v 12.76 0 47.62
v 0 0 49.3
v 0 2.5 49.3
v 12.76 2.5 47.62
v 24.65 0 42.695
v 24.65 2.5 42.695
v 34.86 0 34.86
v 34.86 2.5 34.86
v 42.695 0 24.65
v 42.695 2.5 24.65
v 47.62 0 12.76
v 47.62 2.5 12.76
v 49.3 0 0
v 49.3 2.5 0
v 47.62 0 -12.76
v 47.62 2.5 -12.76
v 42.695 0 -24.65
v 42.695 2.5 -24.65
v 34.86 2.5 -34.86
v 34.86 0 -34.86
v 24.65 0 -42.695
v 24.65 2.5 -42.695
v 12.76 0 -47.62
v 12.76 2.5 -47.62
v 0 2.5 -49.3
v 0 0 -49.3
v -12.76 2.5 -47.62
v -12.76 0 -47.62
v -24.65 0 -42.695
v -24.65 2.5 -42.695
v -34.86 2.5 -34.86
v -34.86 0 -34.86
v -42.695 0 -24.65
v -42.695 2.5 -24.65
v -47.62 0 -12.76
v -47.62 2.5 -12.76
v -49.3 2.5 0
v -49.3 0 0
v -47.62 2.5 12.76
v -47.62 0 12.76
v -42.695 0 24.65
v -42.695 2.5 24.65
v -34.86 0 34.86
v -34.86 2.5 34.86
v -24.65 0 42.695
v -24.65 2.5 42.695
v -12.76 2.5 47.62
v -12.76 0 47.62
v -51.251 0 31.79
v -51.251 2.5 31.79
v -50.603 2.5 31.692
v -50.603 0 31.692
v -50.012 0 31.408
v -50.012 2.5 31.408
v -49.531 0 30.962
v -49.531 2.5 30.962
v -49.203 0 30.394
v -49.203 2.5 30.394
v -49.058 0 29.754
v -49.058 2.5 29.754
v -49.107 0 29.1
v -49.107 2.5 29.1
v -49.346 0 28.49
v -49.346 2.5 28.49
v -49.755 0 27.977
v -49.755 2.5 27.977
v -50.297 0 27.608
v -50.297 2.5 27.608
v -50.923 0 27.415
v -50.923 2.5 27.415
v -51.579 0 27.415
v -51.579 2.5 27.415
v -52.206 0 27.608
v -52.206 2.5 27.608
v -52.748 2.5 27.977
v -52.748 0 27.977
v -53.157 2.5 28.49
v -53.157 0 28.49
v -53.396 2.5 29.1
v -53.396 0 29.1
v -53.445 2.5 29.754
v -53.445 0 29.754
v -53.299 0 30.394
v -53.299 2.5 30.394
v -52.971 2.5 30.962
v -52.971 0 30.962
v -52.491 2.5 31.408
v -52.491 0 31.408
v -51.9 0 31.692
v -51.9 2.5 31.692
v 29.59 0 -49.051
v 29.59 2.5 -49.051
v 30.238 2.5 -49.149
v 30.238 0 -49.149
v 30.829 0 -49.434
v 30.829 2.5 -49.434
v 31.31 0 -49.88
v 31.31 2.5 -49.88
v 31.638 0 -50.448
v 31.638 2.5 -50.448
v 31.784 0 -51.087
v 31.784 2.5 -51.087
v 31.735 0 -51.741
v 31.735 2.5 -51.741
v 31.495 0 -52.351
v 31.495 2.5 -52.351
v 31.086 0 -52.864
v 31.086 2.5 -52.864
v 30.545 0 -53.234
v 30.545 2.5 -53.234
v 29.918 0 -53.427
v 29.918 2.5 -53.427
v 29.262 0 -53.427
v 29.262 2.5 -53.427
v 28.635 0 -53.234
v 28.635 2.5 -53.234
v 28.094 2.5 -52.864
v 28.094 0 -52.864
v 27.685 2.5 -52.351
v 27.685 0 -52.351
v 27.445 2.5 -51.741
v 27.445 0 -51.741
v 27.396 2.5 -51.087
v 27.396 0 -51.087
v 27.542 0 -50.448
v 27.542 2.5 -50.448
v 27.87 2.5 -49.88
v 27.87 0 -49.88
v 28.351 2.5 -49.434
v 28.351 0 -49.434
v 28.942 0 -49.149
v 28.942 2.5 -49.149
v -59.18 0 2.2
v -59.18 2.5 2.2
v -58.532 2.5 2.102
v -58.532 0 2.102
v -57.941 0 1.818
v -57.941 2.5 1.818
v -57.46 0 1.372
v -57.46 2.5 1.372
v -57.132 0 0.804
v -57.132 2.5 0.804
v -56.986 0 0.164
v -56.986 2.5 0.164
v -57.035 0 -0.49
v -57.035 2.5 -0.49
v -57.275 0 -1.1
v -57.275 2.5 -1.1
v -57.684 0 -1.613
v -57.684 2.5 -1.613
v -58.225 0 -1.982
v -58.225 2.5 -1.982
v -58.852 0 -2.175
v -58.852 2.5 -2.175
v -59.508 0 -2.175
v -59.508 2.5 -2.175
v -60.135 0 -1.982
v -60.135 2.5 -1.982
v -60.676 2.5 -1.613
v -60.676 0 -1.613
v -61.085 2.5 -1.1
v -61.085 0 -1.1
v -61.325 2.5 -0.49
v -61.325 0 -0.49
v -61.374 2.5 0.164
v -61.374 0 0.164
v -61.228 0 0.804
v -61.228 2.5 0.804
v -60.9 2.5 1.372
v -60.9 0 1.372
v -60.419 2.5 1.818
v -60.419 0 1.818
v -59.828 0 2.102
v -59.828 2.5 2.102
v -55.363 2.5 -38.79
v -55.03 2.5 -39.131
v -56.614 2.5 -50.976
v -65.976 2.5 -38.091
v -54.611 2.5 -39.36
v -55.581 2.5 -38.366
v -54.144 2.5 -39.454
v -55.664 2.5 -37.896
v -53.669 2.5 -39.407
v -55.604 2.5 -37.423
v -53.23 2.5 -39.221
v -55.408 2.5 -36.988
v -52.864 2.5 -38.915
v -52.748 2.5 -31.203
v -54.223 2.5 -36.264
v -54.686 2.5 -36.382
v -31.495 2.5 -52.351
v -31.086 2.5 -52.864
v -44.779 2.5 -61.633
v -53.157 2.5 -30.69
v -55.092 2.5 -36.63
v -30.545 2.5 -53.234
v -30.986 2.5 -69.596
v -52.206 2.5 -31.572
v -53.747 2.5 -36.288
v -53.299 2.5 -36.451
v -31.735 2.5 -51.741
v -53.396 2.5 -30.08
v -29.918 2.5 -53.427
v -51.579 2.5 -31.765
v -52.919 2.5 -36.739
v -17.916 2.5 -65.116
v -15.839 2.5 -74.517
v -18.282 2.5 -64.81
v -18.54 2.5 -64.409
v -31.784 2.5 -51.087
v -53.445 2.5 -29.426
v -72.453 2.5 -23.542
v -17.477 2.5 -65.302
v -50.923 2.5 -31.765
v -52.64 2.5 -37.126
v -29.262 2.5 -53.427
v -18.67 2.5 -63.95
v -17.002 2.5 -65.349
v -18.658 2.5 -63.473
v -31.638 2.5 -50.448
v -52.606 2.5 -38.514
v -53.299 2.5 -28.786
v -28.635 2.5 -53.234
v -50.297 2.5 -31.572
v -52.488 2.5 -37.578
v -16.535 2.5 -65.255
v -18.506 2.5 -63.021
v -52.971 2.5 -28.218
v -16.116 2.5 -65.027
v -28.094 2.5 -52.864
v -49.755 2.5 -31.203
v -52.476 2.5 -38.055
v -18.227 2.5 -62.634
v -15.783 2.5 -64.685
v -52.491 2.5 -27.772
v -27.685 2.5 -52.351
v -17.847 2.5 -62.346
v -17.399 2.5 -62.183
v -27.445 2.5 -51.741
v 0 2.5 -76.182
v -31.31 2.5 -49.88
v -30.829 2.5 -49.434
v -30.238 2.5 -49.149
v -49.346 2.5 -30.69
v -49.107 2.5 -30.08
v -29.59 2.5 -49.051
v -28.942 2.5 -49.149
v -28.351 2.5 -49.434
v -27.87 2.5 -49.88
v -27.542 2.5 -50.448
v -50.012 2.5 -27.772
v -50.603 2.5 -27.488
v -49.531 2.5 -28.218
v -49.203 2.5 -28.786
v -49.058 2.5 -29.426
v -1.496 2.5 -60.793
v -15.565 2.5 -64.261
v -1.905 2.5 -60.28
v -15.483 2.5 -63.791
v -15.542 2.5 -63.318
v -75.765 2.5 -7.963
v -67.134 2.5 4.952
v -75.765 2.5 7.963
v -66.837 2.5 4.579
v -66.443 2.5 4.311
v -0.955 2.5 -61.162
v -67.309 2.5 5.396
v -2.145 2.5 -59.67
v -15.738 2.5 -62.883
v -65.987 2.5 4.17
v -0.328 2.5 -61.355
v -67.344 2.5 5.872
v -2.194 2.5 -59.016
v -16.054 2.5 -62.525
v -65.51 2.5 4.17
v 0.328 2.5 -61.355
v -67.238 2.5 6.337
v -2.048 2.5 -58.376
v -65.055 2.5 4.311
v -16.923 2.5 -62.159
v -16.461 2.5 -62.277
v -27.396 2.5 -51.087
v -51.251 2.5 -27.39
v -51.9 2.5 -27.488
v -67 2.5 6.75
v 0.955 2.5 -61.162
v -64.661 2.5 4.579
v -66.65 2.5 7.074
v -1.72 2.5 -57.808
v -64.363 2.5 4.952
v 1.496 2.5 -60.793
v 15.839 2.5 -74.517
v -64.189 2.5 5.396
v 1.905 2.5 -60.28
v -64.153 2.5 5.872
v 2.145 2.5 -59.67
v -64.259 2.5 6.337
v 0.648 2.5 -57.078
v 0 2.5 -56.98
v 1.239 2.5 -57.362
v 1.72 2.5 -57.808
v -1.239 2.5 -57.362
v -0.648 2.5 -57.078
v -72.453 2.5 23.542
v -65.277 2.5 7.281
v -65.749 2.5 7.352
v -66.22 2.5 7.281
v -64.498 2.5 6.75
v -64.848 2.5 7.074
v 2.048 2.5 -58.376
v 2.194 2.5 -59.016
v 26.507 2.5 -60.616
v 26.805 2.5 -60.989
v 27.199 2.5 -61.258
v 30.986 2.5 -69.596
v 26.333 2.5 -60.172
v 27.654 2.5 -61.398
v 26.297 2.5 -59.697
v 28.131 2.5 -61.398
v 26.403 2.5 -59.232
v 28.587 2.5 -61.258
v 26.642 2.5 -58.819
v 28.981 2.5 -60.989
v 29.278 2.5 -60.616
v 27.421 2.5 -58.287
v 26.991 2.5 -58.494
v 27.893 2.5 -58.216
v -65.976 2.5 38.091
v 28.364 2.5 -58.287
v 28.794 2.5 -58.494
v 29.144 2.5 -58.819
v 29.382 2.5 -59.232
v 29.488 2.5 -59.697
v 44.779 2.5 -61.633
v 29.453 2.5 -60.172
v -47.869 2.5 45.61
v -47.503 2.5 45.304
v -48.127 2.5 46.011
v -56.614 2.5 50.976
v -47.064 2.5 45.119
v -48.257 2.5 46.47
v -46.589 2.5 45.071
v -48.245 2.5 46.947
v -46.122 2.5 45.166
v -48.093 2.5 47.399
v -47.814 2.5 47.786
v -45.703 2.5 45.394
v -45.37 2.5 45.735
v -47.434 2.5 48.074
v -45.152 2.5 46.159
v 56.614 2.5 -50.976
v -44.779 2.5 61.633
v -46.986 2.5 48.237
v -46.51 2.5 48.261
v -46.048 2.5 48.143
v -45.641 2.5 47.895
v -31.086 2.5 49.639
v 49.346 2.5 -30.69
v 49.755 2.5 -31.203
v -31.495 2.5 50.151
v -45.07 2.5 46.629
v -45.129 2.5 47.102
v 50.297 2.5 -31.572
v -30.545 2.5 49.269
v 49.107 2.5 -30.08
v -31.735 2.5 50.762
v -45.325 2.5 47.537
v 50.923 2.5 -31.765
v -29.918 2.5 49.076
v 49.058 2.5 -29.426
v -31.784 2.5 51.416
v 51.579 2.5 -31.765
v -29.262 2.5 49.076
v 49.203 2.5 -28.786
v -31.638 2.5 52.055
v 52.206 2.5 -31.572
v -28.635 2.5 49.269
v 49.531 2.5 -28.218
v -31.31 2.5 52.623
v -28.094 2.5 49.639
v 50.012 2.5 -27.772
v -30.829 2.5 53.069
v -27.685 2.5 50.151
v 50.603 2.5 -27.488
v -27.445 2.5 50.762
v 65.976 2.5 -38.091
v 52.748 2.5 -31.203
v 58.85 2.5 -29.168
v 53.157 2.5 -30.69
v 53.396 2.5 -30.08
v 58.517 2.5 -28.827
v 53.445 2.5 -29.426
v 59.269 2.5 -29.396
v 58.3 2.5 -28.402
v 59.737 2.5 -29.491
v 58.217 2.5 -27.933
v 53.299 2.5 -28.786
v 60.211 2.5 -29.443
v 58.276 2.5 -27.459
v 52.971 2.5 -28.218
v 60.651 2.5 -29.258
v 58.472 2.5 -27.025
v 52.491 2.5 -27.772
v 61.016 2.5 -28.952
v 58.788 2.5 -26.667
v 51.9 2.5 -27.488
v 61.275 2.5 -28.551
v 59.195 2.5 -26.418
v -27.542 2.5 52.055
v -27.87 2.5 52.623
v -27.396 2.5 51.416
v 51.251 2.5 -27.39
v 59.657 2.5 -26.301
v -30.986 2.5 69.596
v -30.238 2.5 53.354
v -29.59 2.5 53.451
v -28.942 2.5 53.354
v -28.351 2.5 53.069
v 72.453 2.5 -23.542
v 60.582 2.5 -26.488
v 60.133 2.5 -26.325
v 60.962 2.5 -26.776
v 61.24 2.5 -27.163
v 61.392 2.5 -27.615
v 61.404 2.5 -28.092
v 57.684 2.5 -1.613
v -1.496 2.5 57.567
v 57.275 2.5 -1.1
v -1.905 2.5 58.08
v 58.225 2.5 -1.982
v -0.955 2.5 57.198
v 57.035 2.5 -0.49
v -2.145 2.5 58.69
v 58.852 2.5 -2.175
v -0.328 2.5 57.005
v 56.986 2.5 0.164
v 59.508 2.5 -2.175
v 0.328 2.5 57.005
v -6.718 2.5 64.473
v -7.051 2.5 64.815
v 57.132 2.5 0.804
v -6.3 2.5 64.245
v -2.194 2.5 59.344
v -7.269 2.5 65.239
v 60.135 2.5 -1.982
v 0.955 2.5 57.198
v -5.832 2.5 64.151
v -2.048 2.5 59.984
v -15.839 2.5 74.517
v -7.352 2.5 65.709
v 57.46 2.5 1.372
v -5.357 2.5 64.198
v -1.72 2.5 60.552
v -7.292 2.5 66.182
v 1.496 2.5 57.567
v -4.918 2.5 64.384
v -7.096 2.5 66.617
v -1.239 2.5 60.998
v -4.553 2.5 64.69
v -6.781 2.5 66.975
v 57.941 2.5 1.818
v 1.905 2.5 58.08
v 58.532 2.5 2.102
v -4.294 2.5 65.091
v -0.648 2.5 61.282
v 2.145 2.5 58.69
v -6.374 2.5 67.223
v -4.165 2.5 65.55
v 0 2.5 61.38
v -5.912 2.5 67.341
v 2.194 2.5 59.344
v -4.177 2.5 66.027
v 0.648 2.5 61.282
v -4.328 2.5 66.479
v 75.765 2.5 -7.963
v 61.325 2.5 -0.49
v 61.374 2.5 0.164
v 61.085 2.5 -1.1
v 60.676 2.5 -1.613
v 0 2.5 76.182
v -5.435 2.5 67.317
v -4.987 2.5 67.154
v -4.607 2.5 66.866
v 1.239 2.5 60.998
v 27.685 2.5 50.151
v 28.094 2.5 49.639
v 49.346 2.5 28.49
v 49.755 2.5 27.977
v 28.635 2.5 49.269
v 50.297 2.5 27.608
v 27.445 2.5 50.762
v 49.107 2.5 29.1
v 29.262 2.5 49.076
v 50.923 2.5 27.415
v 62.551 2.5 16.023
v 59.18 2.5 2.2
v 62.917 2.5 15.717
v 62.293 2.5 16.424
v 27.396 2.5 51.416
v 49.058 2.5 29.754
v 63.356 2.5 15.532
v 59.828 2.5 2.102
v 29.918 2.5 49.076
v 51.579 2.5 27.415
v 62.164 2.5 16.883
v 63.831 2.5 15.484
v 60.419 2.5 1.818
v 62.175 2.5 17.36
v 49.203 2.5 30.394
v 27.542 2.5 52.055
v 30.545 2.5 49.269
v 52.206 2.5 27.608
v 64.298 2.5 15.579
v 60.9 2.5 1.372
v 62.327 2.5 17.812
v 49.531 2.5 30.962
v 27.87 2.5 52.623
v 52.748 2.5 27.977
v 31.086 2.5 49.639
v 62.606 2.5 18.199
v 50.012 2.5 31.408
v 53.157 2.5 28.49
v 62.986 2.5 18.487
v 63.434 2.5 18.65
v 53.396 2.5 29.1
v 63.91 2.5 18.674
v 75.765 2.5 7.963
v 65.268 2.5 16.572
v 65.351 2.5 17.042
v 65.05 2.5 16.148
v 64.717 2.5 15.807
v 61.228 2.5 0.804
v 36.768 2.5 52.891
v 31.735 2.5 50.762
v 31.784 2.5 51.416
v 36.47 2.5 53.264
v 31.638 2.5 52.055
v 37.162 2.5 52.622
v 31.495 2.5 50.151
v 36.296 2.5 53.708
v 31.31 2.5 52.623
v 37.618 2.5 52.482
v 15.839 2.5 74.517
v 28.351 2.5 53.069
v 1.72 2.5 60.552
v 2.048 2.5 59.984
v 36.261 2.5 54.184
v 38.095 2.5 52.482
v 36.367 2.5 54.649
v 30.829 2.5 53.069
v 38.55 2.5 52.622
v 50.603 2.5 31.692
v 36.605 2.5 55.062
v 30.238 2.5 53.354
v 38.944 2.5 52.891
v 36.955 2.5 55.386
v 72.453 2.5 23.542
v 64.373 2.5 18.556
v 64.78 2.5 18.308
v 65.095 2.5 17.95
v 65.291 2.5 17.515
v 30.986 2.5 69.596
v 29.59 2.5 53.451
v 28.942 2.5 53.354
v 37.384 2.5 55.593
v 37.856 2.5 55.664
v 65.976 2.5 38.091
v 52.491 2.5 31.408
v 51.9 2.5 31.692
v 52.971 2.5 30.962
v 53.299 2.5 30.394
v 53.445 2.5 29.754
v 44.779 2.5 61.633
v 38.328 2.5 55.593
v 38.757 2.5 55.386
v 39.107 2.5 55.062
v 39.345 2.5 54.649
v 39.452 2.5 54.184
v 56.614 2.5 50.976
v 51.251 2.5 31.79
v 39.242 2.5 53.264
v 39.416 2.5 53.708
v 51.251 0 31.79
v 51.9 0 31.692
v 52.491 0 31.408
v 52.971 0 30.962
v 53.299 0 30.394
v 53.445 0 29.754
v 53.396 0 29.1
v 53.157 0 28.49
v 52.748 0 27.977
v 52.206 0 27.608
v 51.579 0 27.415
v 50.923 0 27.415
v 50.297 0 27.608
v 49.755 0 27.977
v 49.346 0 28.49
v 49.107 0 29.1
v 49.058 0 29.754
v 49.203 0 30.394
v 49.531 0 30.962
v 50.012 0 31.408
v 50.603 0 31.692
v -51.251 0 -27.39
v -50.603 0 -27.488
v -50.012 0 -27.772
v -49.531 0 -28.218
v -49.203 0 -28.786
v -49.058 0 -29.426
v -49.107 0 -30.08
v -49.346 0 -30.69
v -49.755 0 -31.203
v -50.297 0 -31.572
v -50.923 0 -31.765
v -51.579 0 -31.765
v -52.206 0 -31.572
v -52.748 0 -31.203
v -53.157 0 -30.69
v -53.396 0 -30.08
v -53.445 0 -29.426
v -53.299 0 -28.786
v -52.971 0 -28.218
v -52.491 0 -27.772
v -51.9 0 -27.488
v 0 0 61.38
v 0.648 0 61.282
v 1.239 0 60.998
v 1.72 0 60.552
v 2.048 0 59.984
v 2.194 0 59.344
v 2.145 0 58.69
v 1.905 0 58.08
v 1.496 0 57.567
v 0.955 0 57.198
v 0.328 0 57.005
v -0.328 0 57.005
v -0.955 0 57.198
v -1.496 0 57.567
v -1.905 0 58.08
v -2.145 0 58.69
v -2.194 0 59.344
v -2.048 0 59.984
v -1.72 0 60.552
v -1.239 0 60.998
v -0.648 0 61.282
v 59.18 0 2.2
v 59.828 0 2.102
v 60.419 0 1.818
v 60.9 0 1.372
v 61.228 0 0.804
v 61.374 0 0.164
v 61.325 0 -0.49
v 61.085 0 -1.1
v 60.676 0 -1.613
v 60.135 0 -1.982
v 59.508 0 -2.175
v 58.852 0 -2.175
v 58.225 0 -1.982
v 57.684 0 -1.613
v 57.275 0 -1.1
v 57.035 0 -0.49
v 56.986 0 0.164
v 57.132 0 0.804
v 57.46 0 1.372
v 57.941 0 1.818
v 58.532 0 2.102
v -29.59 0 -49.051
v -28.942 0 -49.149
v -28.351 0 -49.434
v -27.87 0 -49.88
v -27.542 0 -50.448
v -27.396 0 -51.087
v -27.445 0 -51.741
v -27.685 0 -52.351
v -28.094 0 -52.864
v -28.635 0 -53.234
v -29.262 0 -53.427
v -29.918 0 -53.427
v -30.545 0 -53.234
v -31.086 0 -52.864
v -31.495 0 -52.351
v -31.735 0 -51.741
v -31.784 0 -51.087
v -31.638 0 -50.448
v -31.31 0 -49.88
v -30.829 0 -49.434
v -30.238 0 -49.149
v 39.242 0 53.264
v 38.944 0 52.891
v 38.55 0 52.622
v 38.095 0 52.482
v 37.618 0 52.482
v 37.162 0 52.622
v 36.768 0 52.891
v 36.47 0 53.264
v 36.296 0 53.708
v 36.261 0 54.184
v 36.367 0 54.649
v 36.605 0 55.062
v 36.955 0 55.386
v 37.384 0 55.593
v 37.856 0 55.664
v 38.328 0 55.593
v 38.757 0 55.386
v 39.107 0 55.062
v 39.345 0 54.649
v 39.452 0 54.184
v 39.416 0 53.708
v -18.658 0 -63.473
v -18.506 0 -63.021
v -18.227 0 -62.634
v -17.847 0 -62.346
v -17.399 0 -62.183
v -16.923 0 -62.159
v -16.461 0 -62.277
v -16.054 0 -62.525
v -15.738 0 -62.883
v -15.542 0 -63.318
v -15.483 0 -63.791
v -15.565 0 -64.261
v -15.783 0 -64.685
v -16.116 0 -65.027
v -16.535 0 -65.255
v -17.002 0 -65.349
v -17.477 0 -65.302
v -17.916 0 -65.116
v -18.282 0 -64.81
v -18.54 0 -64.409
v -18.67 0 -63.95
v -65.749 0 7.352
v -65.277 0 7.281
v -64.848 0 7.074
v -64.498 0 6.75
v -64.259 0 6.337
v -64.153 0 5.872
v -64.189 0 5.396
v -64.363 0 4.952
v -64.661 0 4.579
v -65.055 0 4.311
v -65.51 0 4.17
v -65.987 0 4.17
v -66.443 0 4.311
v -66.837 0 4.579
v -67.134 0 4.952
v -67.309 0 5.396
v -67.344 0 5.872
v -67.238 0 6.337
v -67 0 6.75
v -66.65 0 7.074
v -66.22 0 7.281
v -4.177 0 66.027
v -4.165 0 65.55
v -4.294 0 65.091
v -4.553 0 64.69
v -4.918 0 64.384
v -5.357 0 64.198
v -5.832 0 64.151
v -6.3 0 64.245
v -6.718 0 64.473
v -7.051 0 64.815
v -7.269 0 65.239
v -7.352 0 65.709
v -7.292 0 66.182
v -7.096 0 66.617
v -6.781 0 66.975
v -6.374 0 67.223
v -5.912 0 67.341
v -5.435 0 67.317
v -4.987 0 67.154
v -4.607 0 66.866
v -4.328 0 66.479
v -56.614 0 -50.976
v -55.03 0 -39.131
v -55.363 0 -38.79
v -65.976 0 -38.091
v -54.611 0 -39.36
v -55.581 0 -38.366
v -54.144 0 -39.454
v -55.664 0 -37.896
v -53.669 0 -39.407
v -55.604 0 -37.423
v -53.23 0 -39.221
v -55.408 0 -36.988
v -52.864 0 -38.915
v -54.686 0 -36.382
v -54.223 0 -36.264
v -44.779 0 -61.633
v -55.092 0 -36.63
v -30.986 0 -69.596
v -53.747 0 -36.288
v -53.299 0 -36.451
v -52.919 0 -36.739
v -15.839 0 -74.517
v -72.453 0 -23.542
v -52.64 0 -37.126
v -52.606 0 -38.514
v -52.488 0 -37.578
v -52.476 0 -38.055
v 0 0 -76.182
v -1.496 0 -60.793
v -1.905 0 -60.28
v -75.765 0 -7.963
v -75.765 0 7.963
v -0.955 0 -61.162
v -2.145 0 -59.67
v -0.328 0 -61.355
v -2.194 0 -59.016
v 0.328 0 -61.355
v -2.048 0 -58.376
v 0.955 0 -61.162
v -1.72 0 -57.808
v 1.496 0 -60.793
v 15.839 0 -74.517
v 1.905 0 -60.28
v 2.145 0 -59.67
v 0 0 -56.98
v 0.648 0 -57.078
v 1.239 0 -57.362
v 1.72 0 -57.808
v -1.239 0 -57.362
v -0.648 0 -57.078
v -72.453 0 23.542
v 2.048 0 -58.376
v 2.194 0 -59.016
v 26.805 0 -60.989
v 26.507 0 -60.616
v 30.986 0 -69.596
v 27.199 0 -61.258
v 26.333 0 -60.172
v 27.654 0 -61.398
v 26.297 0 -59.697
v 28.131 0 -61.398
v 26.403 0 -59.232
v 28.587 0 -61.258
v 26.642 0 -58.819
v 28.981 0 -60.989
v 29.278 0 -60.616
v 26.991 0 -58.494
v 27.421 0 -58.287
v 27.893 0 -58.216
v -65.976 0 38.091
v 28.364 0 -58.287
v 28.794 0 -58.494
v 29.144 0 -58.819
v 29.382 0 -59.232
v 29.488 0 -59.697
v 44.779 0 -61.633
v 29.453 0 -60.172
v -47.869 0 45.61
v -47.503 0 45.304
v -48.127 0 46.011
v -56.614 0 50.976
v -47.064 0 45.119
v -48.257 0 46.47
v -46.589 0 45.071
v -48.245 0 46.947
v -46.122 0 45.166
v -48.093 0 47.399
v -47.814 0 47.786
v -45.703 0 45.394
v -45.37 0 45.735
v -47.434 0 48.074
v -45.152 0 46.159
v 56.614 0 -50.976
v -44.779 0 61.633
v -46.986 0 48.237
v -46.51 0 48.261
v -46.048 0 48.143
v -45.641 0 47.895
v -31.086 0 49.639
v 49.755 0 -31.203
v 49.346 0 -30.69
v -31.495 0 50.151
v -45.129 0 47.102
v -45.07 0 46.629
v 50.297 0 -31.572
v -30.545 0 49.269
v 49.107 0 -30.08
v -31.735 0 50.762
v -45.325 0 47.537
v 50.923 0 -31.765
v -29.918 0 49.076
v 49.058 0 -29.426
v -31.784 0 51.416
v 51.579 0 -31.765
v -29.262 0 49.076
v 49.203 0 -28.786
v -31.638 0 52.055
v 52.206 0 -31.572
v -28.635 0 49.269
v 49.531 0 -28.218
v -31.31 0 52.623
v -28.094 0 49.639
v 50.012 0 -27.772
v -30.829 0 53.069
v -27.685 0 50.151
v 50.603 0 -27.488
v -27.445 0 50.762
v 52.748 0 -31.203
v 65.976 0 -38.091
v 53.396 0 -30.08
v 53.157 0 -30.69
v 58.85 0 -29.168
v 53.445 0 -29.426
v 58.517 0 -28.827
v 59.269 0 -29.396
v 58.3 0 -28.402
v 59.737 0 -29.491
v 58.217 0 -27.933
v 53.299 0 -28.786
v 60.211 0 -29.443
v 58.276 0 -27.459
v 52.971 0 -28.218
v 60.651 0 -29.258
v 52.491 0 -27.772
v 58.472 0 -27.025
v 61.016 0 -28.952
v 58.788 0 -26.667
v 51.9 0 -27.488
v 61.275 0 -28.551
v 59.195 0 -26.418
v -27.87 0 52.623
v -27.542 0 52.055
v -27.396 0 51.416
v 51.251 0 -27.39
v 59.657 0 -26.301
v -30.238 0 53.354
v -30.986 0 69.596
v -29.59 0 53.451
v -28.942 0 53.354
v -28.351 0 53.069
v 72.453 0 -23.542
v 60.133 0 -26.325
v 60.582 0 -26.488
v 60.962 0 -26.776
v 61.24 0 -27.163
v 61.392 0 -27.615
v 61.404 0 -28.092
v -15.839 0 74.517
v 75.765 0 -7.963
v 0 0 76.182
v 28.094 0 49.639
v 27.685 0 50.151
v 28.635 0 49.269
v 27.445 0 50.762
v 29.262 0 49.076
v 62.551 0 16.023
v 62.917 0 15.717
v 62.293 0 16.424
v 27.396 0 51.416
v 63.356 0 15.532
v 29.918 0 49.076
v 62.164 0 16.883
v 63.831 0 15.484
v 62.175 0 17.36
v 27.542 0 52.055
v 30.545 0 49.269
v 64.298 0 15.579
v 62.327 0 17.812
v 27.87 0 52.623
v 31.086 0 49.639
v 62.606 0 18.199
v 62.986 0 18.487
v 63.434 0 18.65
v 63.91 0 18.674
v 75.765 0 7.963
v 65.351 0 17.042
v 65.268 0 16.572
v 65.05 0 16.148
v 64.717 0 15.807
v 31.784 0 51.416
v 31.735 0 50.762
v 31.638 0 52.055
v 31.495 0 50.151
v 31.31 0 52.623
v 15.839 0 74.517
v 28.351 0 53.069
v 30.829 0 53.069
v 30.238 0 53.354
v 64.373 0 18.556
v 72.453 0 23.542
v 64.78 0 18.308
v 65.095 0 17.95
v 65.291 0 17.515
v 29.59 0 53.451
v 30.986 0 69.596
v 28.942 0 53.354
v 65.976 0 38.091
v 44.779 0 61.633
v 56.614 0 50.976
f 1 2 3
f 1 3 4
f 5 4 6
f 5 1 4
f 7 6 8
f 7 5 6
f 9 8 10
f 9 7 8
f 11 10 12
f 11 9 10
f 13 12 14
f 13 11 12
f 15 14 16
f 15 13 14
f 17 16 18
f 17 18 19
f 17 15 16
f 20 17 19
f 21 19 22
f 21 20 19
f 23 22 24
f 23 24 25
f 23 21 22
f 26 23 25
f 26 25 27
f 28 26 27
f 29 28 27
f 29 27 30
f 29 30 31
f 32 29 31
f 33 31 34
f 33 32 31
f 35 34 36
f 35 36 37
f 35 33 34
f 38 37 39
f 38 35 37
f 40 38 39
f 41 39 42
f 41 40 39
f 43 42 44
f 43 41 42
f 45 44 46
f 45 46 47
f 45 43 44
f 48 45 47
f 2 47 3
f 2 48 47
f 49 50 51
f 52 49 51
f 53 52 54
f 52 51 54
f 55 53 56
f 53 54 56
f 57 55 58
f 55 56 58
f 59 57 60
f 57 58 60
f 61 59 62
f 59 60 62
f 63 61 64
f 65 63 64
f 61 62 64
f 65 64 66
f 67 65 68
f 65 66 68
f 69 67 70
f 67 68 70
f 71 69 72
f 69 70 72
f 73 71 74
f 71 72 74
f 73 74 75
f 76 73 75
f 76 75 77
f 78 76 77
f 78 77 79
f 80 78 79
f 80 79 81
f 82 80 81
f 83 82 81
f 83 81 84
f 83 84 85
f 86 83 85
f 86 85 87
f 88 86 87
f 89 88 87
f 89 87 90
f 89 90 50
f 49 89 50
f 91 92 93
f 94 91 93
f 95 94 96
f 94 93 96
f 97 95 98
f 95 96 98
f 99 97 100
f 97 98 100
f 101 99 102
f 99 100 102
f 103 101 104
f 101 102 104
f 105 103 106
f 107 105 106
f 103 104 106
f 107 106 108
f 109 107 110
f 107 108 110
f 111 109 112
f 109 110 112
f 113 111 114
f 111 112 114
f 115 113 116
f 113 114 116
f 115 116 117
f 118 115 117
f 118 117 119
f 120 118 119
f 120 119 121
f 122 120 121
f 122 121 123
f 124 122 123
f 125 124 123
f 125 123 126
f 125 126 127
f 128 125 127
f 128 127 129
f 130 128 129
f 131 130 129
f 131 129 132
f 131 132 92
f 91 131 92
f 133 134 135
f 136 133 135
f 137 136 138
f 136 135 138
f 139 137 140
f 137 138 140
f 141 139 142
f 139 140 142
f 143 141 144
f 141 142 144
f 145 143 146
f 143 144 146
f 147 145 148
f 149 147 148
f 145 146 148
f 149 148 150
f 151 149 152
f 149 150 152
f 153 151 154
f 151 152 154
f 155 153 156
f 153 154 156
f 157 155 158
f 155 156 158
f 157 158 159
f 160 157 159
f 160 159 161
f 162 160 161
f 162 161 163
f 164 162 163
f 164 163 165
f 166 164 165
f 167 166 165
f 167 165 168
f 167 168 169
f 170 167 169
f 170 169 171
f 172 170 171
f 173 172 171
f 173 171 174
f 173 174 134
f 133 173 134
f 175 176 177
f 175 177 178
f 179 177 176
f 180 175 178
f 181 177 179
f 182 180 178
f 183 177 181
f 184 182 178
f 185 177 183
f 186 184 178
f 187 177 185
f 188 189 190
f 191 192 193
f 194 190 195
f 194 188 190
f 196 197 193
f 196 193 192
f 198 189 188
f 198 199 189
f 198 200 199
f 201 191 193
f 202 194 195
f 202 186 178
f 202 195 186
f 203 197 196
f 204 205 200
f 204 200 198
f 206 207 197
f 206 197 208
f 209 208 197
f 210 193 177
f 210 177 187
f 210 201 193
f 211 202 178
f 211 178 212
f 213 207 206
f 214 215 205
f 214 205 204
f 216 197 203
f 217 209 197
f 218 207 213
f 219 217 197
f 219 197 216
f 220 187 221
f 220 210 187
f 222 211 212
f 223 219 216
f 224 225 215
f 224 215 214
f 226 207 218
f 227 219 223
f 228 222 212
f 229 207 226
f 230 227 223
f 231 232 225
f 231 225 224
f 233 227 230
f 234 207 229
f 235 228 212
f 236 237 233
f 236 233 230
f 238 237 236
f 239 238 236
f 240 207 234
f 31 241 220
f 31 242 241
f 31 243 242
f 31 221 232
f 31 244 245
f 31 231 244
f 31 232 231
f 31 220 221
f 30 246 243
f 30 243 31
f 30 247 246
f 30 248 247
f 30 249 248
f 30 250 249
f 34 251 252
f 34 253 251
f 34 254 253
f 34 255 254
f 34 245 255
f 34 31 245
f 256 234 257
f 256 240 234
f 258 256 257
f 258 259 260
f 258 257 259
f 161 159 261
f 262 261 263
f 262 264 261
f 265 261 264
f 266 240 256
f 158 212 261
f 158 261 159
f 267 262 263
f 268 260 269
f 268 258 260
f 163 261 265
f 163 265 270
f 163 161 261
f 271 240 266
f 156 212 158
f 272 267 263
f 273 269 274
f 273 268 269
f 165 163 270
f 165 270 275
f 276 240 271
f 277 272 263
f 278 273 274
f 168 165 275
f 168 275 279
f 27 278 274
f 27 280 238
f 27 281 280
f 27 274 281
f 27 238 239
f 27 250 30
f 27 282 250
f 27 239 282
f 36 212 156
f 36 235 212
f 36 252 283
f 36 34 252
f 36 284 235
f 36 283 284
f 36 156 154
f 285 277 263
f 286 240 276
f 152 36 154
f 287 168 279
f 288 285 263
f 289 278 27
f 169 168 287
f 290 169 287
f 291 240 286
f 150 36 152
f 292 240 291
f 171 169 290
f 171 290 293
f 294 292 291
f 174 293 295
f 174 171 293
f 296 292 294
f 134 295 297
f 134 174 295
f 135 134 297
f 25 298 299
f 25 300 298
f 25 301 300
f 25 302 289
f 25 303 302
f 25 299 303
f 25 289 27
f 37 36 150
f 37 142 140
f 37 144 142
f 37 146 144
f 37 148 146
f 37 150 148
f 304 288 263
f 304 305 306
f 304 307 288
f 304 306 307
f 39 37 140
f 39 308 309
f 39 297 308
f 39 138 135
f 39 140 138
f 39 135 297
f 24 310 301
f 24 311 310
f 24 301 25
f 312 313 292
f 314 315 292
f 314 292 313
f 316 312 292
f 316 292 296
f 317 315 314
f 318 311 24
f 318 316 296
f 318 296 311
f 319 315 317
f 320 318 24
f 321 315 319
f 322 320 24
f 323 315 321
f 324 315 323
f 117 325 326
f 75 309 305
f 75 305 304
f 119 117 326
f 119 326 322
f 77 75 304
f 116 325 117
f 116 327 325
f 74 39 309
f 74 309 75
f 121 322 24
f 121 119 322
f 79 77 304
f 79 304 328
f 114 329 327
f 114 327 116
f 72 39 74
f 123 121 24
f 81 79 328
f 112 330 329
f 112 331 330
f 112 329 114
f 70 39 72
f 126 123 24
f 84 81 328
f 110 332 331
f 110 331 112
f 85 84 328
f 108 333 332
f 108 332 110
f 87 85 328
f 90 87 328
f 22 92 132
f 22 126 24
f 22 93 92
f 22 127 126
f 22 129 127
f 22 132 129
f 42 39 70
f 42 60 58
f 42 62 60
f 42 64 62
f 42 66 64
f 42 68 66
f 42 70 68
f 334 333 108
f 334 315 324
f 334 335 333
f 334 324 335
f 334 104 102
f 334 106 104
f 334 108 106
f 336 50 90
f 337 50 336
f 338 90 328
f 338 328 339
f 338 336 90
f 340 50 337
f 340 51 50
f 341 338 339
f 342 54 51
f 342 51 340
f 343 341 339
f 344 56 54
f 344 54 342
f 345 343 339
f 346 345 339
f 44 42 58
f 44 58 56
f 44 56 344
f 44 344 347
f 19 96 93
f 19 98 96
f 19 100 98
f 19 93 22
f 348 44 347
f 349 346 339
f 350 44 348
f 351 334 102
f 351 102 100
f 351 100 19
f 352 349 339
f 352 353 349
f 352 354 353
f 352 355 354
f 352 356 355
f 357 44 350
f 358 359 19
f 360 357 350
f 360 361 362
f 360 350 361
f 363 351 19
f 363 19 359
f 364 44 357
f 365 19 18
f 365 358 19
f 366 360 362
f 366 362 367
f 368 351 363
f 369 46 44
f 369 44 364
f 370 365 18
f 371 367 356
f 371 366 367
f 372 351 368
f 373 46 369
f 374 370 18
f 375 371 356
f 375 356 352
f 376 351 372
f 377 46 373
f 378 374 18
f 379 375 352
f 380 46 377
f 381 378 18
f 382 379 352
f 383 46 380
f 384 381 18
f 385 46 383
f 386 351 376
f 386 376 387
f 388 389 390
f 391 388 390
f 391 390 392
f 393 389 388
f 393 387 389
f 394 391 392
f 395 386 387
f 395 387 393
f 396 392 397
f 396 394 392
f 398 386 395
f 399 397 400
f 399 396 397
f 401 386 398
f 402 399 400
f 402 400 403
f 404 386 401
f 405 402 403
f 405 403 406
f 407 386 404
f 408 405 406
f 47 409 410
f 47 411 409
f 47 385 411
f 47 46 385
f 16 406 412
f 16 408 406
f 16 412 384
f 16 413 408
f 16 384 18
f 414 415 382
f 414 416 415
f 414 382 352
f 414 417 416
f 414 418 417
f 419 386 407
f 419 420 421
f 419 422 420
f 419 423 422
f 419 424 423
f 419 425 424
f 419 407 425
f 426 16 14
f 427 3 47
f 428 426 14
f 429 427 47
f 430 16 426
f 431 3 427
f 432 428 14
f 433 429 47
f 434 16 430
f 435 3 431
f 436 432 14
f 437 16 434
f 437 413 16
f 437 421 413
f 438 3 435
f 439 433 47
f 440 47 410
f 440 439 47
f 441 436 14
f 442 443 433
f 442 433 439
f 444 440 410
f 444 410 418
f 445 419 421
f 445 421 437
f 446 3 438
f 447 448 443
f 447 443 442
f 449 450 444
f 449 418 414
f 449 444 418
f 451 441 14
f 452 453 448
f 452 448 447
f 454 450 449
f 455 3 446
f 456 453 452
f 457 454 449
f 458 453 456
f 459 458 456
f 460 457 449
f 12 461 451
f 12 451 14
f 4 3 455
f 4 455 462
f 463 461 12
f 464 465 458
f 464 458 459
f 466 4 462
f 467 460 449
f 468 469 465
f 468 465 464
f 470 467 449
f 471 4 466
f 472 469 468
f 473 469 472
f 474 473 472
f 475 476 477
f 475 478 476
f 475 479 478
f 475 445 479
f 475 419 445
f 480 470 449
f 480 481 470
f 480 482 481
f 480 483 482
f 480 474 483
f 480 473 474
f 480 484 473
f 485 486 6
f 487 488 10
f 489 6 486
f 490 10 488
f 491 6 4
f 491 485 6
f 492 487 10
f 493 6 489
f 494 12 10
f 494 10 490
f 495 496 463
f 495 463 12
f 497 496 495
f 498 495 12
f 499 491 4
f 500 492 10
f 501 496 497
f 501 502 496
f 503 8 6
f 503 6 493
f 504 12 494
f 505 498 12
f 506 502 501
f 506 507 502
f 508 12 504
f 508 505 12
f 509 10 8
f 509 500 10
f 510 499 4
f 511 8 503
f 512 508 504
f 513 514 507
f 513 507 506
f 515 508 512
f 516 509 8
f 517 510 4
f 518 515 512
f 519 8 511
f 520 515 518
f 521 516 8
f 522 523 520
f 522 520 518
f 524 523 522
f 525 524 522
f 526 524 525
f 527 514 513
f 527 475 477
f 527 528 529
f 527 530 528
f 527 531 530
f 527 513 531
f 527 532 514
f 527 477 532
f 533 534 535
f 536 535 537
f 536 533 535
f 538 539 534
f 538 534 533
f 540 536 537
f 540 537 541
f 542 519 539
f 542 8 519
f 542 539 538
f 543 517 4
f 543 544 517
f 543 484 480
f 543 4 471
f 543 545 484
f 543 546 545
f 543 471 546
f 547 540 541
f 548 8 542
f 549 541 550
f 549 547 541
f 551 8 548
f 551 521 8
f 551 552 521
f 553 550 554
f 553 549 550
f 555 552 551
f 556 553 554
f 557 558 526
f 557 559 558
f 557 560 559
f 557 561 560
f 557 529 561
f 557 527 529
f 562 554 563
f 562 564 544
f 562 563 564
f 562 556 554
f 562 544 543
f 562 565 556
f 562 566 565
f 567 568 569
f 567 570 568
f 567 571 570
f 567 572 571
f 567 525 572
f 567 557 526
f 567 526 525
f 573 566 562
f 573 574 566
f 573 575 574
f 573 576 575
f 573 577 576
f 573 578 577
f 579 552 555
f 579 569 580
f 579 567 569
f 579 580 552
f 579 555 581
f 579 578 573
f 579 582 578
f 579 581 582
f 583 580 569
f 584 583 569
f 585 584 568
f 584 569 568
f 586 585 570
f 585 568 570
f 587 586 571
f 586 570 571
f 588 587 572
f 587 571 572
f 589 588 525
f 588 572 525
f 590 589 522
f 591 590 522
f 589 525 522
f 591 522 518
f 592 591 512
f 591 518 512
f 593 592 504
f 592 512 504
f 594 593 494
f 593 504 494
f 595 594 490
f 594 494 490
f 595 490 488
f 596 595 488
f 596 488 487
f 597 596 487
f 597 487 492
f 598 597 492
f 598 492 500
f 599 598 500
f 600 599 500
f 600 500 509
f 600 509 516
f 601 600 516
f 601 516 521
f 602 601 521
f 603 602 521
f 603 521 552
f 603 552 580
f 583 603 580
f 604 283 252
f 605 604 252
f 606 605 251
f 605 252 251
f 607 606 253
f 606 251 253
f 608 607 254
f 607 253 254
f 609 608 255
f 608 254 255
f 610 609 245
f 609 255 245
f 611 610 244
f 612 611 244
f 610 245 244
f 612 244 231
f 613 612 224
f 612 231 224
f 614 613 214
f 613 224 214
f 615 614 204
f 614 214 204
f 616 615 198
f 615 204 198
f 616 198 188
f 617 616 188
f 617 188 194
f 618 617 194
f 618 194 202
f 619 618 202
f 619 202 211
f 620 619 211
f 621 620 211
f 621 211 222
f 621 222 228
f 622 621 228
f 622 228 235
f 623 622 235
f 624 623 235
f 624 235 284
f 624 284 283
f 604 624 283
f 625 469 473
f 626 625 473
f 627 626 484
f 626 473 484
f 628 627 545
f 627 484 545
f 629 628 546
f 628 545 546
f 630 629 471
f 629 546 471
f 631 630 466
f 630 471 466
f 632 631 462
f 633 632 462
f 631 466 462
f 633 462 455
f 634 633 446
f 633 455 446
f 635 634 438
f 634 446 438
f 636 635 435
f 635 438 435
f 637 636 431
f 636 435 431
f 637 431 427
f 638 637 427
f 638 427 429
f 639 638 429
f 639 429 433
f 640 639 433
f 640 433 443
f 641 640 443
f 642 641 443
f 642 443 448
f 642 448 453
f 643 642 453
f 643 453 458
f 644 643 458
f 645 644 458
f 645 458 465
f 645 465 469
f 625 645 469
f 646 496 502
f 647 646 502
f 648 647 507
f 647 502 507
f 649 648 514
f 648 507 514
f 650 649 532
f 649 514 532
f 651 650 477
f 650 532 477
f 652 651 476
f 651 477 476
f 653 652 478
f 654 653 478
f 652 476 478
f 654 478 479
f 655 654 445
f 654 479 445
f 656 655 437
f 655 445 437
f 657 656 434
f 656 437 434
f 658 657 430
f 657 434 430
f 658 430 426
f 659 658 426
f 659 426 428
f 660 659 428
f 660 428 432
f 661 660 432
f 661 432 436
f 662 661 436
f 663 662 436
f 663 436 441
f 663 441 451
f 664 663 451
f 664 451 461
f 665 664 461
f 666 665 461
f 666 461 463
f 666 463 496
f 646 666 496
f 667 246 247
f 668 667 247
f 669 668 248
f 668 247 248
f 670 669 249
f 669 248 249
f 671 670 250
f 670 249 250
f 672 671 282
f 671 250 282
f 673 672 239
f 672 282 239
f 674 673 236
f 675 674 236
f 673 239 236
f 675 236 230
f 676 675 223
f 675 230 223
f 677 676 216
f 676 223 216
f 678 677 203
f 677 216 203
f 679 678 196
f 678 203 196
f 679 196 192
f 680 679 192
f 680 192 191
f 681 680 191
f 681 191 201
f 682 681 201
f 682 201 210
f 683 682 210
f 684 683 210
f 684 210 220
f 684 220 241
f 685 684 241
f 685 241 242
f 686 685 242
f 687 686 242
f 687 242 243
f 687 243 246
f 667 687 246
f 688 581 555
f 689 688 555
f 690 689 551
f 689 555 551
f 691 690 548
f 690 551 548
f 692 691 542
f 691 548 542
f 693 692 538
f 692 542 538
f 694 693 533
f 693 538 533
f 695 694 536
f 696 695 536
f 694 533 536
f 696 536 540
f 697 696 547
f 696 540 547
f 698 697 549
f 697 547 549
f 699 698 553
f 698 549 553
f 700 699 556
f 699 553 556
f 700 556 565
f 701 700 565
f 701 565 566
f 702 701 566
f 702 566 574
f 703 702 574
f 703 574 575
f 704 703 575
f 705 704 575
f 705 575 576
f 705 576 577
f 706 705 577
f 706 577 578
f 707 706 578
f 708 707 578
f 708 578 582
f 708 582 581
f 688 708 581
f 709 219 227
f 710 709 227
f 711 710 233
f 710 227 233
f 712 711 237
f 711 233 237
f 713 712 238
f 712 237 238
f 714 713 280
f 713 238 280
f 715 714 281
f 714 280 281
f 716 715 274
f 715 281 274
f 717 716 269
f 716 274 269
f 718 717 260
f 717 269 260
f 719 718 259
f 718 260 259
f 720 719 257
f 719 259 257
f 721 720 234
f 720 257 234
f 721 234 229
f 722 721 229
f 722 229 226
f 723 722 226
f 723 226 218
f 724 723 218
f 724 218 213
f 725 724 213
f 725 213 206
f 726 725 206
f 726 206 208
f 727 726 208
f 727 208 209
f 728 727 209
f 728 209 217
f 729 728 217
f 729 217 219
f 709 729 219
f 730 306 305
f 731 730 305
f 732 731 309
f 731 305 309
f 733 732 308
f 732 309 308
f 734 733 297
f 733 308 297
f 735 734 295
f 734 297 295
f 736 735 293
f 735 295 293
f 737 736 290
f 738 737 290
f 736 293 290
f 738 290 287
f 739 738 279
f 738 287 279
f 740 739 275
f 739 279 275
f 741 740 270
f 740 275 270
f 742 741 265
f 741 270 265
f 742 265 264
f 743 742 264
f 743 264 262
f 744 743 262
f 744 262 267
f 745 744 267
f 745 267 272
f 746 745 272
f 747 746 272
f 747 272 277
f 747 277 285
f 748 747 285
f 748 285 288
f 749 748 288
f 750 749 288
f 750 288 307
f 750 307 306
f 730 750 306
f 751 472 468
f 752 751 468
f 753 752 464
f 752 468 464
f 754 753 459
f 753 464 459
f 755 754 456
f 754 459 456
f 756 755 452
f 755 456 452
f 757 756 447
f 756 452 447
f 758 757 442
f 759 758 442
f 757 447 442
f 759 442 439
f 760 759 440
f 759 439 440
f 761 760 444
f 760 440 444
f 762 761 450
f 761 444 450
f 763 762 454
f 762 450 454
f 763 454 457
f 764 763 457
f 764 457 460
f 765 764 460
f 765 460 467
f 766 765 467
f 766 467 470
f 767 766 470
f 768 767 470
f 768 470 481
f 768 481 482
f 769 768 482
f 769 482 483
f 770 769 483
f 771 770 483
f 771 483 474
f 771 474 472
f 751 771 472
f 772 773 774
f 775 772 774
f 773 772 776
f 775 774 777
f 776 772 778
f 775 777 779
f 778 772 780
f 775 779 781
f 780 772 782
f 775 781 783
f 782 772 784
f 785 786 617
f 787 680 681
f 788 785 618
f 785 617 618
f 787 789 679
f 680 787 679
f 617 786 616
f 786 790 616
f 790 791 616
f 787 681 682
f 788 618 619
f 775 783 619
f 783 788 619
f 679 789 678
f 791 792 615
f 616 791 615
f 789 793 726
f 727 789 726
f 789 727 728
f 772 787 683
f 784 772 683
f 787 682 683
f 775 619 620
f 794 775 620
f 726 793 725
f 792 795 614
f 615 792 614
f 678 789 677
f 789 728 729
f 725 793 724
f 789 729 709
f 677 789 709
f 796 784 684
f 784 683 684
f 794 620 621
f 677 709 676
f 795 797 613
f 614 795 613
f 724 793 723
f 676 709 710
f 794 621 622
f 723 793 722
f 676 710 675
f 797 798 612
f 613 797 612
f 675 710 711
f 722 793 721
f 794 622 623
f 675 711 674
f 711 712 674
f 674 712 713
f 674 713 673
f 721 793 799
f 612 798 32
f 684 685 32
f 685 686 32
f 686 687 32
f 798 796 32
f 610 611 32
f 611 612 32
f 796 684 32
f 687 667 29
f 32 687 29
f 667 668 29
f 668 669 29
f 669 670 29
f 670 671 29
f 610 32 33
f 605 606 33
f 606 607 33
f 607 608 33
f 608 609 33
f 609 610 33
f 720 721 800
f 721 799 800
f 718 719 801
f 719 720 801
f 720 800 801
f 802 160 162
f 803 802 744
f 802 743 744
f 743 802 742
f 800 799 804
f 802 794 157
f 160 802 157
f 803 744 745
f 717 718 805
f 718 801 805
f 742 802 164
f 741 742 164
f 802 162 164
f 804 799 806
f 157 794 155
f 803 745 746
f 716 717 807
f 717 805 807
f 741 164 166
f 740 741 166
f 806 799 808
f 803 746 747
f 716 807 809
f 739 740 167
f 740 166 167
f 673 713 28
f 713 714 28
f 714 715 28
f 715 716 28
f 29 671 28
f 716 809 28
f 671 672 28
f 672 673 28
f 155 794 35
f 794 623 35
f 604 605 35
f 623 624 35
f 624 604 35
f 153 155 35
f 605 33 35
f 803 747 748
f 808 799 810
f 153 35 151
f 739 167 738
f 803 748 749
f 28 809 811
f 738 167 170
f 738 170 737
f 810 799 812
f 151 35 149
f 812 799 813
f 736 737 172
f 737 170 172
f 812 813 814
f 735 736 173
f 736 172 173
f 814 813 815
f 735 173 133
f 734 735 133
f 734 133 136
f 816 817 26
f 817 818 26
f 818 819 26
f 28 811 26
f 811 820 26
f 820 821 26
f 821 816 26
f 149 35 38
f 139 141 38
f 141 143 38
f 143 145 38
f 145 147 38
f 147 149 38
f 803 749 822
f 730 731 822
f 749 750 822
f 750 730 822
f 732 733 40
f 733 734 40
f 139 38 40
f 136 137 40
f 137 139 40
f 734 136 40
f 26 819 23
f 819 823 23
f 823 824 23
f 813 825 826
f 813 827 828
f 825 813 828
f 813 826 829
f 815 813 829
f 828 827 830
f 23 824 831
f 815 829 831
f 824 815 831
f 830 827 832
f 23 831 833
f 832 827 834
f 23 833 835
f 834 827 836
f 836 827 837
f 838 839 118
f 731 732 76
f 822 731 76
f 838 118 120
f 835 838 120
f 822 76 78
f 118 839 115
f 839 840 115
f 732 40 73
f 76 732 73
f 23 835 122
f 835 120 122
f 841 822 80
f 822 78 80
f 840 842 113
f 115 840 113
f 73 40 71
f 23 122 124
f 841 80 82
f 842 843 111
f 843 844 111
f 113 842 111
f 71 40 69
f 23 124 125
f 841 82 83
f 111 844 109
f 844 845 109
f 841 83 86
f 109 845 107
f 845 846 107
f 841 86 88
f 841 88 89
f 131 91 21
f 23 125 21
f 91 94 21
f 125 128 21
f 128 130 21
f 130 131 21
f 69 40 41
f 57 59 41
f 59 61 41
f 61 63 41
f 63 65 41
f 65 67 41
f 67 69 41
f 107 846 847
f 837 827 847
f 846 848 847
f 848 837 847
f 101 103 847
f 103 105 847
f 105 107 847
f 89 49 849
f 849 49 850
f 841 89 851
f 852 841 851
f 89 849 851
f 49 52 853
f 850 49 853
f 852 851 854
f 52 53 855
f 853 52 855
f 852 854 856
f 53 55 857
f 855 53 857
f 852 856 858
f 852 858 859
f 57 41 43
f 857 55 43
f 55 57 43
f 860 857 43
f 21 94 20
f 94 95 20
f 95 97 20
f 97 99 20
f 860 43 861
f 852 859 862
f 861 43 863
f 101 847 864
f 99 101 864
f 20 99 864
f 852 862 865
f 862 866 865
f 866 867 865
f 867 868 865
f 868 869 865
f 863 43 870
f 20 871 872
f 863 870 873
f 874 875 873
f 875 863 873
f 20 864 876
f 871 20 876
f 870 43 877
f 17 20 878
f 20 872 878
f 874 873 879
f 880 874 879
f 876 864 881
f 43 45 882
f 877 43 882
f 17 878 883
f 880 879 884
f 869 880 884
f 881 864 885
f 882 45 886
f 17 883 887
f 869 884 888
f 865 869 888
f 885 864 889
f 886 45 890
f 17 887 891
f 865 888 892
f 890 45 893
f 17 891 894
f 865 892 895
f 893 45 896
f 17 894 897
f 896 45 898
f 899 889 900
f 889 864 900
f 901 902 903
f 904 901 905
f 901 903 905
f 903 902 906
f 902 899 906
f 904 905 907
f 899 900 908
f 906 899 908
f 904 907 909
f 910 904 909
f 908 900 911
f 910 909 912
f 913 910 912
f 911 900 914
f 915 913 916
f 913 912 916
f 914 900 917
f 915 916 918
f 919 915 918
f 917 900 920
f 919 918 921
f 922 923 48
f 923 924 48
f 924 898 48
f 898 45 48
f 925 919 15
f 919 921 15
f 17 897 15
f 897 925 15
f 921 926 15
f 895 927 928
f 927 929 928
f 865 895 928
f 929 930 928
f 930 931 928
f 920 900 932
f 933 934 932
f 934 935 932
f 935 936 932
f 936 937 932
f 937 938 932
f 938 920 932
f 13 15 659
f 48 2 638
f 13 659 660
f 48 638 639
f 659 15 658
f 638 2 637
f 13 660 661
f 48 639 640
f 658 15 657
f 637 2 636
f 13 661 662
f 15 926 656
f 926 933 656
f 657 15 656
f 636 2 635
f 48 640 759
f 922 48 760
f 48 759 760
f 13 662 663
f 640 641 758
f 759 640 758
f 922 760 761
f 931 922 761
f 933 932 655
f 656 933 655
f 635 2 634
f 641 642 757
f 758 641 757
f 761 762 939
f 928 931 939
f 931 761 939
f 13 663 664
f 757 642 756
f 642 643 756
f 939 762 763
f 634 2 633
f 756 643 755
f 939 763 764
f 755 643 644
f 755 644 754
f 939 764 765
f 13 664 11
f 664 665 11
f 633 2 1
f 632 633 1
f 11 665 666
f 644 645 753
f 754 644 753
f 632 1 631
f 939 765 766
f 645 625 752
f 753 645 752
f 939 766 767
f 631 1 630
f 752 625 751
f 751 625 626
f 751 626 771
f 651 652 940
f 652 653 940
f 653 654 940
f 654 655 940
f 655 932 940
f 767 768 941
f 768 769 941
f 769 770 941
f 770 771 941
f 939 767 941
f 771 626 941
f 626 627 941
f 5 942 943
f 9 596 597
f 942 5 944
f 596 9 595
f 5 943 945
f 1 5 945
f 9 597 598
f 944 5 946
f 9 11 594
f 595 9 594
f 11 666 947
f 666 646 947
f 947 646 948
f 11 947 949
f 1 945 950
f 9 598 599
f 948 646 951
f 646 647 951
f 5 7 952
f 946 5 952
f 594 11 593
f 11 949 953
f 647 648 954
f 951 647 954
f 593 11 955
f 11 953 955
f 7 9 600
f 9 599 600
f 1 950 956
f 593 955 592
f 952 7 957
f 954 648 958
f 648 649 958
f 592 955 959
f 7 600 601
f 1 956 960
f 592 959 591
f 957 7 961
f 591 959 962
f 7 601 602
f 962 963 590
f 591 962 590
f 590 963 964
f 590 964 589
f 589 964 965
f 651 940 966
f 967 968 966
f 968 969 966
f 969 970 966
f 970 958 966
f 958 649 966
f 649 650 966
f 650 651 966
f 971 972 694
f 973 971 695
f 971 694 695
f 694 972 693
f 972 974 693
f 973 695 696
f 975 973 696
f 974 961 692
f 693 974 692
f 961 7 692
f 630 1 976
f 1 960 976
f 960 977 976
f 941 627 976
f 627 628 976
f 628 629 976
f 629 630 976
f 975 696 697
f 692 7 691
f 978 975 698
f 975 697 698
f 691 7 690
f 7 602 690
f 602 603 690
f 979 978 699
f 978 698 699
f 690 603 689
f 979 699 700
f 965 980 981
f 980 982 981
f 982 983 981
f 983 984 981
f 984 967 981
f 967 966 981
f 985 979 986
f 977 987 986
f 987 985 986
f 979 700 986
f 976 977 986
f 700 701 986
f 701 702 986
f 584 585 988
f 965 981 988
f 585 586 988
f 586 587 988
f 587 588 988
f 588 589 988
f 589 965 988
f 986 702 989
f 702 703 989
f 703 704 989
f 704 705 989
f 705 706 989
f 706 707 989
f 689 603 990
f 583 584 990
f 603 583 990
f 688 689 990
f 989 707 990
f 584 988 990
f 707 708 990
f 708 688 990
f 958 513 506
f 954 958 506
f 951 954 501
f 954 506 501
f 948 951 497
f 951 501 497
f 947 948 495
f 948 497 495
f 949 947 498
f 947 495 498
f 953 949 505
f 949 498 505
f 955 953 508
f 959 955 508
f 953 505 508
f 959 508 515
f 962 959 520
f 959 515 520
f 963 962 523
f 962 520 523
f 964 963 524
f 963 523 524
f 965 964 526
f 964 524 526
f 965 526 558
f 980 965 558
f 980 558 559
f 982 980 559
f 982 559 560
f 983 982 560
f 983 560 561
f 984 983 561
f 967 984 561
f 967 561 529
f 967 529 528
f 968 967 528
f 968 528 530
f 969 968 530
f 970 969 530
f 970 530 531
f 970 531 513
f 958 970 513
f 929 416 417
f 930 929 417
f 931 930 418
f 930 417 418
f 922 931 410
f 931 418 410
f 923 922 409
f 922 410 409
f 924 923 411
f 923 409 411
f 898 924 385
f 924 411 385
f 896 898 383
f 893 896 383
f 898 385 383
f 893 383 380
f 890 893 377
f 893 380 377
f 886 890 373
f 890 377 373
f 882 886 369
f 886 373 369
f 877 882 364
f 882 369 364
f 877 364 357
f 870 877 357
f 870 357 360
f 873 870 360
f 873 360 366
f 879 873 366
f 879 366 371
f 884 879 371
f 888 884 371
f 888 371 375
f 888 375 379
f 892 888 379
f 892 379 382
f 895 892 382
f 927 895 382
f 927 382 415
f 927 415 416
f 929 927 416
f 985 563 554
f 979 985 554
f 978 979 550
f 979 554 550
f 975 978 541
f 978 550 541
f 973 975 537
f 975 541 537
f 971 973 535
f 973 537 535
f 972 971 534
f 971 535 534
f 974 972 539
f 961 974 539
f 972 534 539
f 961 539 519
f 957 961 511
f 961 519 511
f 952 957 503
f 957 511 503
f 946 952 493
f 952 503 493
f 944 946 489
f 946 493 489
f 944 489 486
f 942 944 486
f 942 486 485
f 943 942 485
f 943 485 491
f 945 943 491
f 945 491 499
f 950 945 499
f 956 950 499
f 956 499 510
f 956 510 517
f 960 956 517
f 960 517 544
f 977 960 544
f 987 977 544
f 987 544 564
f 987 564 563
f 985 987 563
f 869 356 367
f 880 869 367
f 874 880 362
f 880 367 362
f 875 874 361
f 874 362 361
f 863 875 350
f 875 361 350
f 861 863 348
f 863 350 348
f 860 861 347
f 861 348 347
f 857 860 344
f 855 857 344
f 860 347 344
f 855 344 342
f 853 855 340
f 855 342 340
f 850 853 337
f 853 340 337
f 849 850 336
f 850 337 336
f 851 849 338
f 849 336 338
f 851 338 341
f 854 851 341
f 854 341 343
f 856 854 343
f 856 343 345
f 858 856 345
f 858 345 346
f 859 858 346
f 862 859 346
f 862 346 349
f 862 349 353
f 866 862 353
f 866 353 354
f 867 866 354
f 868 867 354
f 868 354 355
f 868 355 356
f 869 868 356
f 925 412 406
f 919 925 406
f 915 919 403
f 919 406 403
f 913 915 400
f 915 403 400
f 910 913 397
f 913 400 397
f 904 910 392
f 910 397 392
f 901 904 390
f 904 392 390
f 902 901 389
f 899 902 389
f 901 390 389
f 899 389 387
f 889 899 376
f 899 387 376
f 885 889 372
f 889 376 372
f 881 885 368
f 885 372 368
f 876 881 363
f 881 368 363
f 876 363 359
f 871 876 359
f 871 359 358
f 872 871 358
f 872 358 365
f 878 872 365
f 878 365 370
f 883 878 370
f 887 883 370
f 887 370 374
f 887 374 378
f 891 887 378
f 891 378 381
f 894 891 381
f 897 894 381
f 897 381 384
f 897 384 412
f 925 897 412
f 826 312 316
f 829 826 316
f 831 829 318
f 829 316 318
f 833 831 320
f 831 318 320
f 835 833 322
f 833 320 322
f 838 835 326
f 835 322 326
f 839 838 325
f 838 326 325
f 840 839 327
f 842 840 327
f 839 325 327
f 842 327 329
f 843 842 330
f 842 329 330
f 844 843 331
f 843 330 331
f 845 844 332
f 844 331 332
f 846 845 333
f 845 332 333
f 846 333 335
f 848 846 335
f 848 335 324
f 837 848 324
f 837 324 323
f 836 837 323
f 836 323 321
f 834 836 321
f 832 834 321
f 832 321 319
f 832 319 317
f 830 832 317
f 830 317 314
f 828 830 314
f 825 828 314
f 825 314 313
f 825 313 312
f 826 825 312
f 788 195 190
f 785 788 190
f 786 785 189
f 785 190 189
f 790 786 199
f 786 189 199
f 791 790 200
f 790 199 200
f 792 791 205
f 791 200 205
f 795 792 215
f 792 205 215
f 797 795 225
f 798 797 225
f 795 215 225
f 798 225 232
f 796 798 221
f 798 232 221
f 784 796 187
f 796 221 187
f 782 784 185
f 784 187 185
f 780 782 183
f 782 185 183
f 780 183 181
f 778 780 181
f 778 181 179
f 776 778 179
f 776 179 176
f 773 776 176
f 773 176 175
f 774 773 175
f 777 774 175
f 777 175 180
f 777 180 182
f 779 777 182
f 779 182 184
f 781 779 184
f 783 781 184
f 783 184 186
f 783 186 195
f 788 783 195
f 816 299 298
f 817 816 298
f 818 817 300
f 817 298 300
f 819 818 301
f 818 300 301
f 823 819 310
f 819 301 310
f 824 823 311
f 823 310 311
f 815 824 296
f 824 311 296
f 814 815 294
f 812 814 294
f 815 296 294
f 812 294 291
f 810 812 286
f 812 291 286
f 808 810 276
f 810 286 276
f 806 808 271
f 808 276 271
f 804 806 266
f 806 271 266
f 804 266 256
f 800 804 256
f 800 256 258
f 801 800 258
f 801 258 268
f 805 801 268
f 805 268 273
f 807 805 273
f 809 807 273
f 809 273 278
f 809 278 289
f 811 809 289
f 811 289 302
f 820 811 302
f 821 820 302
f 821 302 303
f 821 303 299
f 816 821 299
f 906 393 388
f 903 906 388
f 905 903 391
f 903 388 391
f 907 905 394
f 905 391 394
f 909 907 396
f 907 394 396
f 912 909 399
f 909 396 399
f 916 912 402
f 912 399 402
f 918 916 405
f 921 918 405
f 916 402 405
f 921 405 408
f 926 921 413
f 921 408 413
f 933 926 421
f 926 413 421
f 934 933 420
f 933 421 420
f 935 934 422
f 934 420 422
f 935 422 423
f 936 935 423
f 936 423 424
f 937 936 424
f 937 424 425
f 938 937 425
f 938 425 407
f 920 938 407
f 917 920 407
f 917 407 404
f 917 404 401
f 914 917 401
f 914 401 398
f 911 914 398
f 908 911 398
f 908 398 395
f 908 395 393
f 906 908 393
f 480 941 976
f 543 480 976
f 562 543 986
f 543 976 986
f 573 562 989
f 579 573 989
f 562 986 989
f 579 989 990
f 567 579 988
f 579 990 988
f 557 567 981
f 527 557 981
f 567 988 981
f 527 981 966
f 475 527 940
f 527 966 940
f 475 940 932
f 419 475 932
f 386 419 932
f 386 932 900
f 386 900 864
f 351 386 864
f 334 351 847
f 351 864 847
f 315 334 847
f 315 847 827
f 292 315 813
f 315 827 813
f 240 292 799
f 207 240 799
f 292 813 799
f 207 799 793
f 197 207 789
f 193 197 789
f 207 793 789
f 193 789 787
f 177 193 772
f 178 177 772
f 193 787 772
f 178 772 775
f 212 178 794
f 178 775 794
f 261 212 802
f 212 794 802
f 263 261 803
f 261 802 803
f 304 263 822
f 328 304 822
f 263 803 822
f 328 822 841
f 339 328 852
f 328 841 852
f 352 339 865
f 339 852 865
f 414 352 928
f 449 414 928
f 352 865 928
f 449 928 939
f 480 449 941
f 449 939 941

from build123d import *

# Parameters (mm, degrees)
SKETCH1_R           = 76.182
SKETCH1_R_2         = 49.3
BOSS_EXTRUDE1_DEPTH = 2.5
SKETCH2_R           = 1.6
CUT_EXTRUDE1_DEPTH  = 108.766619359
SKETCH3_R           = 2.2
CUT_EXTRUDE2_DEPTH  = 108.766619359
CIRPATTERN1_COUNT   = 9


with BuildPart() as part:
    # Sketch1 → Boss-Extrude1 (new body)
    with BuildSketch(Plane(origin=(0, 0, 0), x_dir=(1, 0, 0), z_dir=(0, 1, 0))):
        with Locations(Location((0, 0, 0), (0, 0, 270))):
            Circle(SKETCH1_R)
        with Locations(Location((0, 0, 0), (0, 0, 270))):
            Circle(SKETCH1_R_2, mode=Mode.SUBTRACT)
    extrude(amount=BOSS_EXTRUDE1_DEPTH)

    # Sketch2 → Cut-Extrude1 (cut, through all)
    with BuildSketch(Plane(origin=(0, 2.5, 0), x_dir=(1, 0, 0), z_dir=(0, 1, 0))):
        with Locations(Location((-65.748850074, -5.752279021, 0), (0, 0, 270))):
            Circle(SKETCH2_R)
    cut_extrude1 = extrude(amount=-CUT_EXTRUDE1_DEPTH, mode=Mode.SUBTRACT)

    # Sketch3 → Cut-Extrude2 (cut, through all)
    with BuildSketch(Plane(origin=(0, 2.5, 0), x_dir=(1, 0, 0), z_dir=(0, 1, 0))):
        with Locations(Location((0, 59.18, 0), (0, 0, 270))):
            Circle(SKETCH3_R)
        with Locations(Location((29.59, 51.251383396, 0), (0, 0, 270))):
            Circle(SKETCH3_R)
        with Locations(Location((51.251383396, 29.59, 0), (0, 0, 270))):
            Circle(SKETCH3_R)
        with Locations(Location((59.18, 0, 0), (0, 0, 270))):
            Circle(SKETCH3_R)
        with Locations(Location((51.251383396, -29.59, 0), (0, 0, 270))):
            Circle(SKETCH3_R)
        with Locations(Location((29.59, -51.251383396, 0), (0, 0, 270))):
            Circle(SKETCH3_R)
        with Locations(Location((0, -59.18, 0), (0, 0, 270))):
            Circle(SKETCH3_R)
        with Locations(Location((-29.59, -51.251383396, 0), (0, 0, 270))):
            Circle(SKETCH3_R)
        with Locations(Location((-51.251383396, -29.59, 0), (0, 0, 270))):
            Circle(SKETCH3_R)
        with Locations(Location((-59.18, 0, 0), (0, 0, 270))):
            Circle(SKETCH3_R)
        with Locations(Location((-51.251383396, 29.59, 0), (0, 0, 270))):
            Circle(SKETCH3_R)
        with Locations(Location((-29.59, 51.251383396, 0), (0, 0, 270))):
            Circle(SKETCH3_R)
    extrude(amount=-CUT_EXTRUDE2_DEPTH, mode=Mode.SUBTRACT)

    # CirPattern1: Cut-Extrude1 ×9 about axis
    cirpattern1_axis = Axis((0, 0, 0), (0, 1, 0))
    for i in range(1, CIRPATTERN1_COUNT):
        add(cut_extrude1.rotate(cirpattern1_axis, i * 360 / CIRPATTERN1_COUNT), mode=Mode.SUBTRACT)


solid = part.part
